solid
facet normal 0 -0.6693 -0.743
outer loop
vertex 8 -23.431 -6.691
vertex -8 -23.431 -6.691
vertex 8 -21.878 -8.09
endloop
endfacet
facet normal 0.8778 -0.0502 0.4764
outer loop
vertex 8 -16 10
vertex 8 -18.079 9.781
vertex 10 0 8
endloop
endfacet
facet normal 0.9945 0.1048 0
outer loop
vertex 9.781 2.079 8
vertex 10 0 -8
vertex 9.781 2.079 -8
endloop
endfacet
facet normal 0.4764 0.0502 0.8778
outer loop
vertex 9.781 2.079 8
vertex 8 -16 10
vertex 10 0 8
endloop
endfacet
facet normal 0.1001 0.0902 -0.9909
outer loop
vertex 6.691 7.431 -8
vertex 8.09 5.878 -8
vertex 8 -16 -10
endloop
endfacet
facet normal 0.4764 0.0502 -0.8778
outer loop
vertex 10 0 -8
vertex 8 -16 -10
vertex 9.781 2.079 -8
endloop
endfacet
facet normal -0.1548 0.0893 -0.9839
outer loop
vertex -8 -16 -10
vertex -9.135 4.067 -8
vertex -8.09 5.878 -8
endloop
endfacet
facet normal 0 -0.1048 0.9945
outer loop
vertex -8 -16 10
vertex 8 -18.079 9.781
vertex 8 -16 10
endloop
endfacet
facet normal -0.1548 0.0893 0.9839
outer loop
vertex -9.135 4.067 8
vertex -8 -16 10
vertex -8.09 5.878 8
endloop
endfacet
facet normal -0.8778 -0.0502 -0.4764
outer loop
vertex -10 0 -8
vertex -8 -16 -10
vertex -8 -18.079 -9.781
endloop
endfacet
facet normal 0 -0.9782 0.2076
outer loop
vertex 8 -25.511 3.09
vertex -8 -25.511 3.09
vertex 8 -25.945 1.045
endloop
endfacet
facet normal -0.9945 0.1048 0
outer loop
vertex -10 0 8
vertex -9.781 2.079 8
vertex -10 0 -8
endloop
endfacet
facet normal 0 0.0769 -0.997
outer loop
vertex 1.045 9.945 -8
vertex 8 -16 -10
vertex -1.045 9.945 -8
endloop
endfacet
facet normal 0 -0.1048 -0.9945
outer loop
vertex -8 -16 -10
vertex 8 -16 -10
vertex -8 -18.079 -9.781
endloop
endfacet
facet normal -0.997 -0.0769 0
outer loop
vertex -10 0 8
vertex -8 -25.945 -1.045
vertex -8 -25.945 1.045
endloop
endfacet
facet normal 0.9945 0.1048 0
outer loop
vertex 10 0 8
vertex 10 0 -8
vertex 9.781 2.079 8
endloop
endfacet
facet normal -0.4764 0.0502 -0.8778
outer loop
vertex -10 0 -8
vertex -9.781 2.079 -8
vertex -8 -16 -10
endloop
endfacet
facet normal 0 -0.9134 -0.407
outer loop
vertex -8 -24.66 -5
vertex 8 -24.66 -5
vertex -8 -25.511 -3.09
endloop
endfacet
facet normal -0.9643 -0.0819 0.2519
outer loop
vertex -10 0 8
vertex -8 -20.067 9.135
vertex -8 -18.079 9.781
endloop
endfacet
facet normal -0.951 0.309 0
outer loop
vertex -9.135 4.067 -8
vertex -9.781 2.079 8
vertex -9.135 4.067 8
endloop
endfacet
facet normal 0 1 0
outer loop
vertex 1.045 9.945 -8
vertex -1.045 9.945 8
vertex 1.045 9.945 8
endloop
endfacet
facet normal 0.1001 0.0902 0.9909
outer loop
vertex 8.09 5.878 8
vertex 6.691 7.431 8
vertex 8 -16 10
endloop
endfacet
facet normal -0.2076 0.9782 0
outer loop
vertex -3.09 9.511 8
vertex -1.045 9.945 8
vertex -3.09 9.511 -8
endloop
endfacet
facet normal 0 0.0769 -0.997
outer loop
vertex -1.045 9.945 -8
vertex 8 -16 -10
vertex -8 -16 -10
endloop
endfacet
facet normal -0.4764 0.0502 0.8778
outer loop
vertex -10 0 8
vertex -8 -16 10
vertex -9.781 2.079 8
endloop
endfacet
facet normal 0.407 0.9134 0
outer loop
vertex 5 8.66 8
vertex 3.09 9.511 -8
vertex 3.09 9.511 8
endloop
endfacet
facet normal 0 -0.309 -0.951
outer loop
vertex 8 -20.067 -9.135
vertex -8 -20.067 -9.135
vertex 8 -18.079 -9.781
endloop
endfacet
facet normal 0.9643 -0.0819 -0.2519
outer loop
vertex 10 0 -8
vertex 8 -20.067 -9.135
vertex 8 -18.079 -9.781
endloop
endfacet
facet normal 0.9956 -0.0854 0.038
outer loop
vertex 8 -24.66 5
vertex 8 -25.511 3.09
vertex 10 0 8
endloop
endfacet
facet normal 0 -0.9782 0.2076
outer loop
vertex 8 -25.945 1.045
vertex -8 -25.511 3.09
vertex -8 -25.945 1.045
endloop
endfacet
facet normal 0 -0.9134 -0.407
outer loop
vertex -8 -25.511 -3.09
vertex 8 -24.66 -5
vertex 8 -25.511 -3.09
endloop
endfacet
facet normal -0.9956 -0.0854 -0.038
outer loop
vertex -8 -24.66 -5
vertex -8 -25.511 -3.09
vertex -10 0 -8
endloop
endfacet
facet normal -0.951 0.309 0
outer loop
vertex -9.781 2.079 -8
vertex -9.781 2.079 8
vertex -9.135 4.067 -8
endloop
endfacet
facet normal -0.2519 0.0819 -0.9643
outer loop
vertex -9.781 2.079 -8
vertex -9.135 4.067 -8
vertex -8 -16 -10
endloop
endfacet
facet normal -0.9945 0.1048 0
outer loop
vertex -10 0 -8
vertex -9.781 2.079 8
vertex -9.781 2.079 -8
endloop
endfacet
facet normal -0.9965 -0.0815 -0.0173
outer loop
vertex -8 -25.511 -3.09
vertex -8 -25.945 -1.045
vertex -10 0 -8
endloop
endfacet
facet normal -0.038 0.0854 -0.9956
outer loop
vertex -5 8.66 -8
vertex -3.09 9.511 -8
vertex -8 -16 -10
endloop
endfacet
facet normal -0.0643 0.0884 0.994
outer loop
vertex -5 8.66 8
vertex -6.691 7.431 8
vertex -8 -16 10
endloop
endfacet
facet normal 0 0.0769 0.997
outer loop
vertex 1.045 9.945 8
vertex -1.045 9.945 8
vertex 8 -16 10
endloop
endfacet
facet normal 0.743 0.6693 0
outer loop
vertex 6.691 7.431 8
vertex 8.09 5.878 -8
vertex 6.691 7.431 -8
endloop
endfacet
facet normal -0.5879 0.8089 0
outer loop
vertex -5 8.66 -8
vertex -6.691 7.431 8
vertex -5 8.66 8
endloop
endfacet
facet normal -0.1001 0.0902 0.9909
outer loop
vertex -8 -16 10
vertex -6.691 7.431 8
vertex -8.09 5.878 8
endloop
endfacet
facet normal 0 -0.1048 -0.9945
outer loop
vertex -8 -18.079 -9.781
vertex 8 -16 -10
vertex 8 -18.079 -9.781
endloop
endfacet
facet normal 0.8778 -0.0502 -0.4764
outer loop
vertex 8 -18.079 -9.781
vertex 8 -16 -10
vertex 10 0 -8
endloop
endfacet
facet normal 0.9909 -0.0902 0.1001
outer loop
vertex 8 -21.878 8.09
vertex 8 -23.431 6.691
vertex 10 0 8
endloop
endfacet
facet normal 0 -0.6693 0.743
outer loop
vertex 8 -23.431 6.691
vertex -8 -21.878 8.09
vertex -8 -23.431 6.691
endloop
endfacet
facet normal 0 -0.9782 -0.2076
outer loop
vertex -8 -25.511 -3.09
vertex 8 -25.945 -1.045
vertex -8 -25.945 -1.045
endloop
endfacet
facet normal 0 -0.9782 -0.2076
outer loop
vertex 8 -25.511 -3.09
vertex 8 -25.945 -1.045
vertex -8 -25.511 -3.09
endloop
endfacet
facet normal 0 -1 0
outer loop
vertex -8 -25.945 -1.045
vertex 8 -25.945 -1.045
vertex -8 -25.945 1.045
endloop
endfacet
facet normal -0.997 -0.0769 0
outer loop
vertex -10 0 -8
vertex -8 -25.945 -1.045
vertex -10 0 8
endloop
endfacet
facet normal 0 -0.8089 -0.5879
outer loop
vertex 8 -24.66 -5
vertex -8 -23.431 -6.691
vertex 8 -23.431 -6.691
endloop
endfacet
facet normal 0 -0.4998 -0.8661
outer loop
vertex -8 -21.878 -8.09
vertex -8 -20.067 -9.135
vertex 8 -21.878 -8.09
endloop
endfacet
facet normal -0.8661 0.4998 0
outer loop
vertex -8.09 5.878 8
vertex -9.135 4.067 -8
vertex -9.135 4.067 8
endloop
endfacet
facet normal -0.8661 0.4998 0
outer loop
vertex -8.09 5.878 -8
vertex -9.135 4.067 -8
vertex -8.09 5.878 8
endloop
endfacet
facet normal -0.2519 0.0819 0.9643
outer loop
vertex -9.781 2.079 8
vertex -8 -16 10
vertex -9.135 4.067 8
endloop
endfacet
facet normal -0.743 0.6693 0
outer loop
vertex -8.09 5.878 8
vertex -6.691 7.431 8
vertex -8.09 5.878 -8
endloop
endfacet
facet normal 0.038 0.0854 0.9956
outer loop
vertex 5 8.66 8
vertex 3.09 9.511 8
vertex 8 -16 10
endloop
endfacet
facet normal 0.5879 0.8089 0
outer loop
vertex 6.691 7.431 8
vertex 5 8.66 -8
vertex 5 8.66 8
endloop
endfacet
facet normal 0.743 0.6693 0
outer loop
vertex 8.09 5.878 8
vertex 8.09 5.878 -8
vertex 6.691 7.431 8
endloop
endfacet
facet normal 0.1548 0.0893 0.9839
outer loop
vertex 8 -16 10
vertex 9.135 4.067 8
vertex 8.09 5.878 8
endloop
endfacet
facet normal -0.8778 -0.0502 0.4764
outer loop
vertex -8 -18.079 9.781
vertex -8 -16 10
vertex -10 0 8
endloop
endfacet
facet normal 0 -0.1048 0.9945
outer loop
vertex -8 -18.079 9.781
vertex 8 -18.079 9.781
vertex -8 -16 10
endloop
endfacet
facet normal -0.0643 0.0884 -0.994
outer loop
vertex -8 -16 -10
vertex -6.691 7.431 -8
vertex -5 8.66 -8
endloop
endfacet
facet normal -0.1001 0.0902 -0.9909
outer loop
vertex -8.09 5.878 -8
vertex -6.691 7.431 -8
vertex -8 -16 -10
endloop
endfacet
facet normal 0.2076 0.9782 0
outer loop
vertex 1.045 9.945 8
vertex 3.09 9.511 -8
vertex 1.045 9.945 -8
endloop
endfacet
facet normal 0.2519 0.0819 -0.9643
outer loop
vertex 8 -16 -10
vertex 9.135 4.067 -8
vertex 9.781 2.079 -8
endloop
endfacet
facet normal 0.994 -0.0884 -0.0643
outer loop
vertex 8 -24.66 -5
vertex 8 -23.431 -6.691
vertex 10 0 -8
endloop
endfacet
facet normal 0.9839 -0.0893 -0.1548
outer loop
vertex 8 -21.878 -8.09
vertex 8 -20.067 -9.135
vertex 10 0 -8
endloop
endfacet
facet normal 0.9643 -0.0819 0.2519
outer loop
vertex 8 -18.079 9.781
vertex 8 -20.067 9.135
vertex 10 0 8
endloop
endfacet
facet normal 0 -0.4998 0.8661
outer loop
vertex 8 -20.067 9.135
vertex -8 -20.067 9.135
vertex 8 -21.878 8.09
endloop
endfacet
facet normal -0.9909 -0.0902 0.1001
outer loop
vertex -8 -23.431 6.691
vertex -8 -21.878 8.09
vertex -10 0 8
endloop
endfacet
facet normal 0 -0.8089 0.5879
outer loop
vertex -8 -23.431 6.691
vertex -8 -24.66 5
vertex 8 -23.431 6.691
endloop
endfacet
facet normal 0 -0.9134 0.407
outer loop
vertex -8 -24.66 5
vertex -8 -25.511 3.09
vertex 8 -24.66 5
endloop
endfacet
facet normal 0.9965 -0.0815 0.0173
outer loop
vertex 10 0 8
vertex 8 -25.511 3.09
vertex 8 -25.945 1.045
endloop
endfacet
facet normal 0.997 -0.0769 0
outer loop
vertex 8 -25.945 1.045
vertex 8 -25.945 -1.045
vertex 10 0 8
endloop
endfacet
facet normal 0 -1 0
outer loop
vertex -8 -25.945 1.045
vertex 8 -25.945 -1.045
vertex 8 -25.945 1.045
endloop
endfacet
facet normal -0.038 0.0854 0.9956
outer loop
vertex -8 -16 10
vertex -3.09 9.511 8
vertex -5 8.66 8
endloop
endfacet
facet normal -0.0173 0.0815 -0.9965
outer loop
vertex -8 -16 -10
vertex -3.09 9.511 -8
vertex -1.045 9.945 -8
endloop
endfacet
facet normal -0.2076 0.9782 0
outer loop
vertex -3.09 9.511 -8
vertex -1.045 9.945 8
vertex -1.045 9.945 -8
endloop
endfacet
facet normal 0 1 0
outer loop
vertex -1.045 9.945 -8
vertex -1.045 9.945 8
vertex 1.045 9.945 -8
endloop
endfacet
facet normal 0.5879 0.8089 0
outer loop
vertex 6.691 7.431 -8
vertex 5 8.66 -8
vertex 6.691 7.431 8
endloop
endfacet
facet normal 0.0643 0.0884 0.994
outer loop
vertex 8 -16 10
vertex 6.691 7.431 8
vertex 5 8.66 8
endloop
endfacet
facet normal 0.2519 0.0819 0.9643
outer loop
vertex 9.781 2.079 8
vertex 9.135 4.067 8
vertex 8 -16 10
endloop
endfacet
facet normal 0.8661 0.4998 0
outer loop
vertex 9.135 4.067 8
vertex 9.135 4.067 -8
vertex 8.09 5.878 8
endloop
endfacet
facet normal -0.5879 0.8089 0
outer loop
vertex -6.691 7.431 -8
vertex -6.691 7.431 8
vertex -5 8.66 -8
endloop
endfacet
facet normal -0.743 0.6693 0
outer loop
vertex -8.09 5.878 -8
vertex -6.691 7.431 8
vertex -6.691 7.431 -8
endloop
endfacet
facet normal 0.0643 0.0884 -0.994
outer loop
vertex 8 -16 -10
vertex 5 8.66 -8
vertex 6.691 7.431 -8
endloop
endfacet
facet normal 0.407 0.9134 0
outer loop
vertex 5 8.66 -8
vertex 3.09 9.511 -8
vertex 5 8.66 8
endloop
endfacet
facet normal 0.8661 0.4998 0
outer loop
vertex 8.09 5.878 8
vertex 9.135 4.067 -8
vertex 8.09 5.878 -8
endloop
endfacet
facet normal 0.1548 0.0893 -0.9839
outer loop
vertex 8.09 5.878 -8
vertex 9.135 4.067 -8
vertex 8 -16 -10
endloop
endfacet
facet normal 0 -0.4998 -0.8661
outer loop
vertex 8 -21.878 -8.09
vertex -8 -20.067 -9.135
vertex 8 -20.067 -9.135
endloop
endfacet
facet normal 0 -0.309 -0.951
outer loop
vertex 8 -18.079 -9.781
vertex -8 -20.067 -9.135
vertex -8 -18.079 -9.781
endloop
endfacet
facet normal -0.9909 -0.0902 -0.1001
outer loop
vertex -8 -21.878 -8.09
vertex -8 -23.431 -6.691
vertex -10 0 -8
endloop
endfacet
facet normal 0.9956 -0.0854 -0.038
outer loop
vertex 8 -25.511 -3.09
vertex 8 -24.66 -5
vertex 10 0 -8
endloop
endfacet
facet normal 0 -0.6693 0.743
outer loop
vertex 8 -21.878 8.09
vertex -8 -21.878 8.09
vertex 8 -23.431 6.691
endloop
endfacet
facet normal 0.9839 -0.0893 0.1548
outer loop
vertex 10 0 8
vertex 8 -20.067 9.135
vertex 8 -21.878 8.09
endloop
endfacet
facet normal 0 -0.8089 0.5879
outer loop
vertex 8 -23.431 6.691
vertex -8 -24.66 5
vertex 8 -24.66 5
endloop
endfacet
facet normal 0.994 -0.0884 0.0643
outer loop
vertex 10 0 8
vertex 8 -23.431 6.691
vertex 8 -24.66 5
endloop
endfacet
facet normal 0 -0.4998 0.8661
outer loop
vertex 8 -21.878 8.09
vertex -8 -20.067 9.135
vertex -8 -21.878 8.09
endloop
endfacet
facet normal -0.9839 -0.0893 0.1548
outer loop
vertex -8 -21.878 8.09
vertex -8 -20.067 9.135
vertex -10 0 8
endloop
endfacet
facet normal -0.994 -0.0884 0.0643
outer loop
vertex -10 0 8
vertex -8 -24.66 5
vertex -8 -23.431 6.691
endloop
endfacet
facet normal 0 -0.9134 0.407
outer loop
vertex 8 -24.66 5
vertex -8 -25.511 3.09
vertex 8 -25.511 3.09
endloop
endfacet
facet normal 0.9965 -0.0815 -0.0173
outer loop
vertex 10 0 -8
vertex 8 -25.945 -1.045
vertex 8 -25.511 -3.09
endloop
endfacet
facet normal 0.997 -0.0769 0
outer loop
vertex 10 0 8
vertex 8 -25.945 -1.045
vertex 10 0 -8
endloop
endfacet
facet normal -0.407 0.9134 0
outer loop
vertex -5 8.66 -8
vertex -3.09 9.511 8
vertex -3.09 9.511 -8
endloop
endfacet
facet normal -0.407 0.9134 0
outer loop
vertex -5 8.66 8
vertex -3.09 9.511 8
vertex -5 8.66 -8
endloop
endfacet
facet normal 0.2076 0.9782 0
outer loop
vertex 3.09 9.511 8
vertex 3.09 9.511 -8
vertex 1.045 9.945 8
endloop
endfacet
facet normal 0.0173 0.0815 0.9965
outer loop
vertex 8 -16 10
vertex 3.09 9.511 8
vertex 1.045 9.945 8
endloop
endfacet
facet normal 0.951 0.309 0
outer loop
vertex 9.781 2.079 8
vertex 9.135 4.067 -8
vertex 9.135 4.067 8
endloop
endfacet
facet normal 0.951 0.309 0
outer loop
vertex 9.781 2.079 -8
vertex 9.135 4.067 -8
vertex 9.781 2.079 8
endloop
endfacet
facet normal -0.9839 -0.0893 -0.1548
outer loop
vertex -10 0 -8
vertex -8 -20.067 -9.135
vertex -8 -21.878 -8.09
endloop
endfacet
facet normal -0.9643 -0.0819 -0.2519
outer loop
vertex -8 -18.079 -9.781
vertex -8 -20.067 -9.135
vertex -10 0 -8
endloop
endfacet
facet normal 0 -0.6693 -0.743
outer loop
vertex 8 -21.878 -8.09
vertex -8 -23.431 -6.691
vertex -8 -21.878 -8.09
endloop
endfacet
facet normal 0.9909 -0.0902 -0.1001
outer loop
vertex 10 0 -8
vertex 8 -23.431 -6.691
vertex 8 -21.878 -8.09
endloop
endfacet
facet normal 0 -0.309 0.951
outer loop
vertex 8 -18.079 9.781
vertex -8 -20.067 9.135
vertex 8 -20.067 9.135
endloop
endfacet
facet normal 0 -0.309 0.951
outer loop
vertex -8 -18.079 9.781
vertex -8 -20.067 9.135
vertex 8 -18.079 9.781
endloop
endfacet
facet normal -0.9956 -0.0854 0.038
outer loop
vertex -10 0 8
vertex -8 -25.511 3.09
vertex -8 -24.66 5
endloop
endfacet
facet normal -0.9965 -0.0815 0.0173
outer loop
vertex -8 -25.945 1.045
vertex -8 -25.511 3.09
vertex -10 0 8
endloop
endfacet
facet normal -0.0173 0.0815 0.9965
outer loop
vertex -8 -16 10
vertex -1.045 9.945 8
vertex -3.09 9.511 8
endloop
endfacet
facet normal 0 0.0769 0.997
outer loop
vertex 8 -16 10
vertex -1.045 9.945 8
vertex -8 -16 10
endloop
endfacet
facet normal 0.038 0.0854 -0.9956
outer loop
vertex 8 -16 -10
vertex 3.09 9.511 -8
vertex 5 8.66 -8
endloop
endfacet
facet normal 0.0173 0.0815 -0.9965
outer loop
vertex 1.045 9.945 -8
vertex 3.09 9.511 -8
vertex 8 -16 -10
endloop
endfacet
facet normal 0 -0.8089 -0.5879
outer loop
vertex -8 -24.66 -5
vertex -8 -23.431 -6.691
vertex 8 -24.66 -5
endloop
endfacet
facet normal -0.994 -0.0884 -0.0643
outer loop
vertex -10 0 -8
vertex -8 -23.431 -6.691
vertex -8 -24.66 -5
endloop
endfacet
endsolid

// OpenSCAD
hull() {
  cylinder(d=20, h=16, center=true);
  translate([0,-16,0])
    rotate([0,90,0])
      cylinder(d=20, h=16, center=true);
}
